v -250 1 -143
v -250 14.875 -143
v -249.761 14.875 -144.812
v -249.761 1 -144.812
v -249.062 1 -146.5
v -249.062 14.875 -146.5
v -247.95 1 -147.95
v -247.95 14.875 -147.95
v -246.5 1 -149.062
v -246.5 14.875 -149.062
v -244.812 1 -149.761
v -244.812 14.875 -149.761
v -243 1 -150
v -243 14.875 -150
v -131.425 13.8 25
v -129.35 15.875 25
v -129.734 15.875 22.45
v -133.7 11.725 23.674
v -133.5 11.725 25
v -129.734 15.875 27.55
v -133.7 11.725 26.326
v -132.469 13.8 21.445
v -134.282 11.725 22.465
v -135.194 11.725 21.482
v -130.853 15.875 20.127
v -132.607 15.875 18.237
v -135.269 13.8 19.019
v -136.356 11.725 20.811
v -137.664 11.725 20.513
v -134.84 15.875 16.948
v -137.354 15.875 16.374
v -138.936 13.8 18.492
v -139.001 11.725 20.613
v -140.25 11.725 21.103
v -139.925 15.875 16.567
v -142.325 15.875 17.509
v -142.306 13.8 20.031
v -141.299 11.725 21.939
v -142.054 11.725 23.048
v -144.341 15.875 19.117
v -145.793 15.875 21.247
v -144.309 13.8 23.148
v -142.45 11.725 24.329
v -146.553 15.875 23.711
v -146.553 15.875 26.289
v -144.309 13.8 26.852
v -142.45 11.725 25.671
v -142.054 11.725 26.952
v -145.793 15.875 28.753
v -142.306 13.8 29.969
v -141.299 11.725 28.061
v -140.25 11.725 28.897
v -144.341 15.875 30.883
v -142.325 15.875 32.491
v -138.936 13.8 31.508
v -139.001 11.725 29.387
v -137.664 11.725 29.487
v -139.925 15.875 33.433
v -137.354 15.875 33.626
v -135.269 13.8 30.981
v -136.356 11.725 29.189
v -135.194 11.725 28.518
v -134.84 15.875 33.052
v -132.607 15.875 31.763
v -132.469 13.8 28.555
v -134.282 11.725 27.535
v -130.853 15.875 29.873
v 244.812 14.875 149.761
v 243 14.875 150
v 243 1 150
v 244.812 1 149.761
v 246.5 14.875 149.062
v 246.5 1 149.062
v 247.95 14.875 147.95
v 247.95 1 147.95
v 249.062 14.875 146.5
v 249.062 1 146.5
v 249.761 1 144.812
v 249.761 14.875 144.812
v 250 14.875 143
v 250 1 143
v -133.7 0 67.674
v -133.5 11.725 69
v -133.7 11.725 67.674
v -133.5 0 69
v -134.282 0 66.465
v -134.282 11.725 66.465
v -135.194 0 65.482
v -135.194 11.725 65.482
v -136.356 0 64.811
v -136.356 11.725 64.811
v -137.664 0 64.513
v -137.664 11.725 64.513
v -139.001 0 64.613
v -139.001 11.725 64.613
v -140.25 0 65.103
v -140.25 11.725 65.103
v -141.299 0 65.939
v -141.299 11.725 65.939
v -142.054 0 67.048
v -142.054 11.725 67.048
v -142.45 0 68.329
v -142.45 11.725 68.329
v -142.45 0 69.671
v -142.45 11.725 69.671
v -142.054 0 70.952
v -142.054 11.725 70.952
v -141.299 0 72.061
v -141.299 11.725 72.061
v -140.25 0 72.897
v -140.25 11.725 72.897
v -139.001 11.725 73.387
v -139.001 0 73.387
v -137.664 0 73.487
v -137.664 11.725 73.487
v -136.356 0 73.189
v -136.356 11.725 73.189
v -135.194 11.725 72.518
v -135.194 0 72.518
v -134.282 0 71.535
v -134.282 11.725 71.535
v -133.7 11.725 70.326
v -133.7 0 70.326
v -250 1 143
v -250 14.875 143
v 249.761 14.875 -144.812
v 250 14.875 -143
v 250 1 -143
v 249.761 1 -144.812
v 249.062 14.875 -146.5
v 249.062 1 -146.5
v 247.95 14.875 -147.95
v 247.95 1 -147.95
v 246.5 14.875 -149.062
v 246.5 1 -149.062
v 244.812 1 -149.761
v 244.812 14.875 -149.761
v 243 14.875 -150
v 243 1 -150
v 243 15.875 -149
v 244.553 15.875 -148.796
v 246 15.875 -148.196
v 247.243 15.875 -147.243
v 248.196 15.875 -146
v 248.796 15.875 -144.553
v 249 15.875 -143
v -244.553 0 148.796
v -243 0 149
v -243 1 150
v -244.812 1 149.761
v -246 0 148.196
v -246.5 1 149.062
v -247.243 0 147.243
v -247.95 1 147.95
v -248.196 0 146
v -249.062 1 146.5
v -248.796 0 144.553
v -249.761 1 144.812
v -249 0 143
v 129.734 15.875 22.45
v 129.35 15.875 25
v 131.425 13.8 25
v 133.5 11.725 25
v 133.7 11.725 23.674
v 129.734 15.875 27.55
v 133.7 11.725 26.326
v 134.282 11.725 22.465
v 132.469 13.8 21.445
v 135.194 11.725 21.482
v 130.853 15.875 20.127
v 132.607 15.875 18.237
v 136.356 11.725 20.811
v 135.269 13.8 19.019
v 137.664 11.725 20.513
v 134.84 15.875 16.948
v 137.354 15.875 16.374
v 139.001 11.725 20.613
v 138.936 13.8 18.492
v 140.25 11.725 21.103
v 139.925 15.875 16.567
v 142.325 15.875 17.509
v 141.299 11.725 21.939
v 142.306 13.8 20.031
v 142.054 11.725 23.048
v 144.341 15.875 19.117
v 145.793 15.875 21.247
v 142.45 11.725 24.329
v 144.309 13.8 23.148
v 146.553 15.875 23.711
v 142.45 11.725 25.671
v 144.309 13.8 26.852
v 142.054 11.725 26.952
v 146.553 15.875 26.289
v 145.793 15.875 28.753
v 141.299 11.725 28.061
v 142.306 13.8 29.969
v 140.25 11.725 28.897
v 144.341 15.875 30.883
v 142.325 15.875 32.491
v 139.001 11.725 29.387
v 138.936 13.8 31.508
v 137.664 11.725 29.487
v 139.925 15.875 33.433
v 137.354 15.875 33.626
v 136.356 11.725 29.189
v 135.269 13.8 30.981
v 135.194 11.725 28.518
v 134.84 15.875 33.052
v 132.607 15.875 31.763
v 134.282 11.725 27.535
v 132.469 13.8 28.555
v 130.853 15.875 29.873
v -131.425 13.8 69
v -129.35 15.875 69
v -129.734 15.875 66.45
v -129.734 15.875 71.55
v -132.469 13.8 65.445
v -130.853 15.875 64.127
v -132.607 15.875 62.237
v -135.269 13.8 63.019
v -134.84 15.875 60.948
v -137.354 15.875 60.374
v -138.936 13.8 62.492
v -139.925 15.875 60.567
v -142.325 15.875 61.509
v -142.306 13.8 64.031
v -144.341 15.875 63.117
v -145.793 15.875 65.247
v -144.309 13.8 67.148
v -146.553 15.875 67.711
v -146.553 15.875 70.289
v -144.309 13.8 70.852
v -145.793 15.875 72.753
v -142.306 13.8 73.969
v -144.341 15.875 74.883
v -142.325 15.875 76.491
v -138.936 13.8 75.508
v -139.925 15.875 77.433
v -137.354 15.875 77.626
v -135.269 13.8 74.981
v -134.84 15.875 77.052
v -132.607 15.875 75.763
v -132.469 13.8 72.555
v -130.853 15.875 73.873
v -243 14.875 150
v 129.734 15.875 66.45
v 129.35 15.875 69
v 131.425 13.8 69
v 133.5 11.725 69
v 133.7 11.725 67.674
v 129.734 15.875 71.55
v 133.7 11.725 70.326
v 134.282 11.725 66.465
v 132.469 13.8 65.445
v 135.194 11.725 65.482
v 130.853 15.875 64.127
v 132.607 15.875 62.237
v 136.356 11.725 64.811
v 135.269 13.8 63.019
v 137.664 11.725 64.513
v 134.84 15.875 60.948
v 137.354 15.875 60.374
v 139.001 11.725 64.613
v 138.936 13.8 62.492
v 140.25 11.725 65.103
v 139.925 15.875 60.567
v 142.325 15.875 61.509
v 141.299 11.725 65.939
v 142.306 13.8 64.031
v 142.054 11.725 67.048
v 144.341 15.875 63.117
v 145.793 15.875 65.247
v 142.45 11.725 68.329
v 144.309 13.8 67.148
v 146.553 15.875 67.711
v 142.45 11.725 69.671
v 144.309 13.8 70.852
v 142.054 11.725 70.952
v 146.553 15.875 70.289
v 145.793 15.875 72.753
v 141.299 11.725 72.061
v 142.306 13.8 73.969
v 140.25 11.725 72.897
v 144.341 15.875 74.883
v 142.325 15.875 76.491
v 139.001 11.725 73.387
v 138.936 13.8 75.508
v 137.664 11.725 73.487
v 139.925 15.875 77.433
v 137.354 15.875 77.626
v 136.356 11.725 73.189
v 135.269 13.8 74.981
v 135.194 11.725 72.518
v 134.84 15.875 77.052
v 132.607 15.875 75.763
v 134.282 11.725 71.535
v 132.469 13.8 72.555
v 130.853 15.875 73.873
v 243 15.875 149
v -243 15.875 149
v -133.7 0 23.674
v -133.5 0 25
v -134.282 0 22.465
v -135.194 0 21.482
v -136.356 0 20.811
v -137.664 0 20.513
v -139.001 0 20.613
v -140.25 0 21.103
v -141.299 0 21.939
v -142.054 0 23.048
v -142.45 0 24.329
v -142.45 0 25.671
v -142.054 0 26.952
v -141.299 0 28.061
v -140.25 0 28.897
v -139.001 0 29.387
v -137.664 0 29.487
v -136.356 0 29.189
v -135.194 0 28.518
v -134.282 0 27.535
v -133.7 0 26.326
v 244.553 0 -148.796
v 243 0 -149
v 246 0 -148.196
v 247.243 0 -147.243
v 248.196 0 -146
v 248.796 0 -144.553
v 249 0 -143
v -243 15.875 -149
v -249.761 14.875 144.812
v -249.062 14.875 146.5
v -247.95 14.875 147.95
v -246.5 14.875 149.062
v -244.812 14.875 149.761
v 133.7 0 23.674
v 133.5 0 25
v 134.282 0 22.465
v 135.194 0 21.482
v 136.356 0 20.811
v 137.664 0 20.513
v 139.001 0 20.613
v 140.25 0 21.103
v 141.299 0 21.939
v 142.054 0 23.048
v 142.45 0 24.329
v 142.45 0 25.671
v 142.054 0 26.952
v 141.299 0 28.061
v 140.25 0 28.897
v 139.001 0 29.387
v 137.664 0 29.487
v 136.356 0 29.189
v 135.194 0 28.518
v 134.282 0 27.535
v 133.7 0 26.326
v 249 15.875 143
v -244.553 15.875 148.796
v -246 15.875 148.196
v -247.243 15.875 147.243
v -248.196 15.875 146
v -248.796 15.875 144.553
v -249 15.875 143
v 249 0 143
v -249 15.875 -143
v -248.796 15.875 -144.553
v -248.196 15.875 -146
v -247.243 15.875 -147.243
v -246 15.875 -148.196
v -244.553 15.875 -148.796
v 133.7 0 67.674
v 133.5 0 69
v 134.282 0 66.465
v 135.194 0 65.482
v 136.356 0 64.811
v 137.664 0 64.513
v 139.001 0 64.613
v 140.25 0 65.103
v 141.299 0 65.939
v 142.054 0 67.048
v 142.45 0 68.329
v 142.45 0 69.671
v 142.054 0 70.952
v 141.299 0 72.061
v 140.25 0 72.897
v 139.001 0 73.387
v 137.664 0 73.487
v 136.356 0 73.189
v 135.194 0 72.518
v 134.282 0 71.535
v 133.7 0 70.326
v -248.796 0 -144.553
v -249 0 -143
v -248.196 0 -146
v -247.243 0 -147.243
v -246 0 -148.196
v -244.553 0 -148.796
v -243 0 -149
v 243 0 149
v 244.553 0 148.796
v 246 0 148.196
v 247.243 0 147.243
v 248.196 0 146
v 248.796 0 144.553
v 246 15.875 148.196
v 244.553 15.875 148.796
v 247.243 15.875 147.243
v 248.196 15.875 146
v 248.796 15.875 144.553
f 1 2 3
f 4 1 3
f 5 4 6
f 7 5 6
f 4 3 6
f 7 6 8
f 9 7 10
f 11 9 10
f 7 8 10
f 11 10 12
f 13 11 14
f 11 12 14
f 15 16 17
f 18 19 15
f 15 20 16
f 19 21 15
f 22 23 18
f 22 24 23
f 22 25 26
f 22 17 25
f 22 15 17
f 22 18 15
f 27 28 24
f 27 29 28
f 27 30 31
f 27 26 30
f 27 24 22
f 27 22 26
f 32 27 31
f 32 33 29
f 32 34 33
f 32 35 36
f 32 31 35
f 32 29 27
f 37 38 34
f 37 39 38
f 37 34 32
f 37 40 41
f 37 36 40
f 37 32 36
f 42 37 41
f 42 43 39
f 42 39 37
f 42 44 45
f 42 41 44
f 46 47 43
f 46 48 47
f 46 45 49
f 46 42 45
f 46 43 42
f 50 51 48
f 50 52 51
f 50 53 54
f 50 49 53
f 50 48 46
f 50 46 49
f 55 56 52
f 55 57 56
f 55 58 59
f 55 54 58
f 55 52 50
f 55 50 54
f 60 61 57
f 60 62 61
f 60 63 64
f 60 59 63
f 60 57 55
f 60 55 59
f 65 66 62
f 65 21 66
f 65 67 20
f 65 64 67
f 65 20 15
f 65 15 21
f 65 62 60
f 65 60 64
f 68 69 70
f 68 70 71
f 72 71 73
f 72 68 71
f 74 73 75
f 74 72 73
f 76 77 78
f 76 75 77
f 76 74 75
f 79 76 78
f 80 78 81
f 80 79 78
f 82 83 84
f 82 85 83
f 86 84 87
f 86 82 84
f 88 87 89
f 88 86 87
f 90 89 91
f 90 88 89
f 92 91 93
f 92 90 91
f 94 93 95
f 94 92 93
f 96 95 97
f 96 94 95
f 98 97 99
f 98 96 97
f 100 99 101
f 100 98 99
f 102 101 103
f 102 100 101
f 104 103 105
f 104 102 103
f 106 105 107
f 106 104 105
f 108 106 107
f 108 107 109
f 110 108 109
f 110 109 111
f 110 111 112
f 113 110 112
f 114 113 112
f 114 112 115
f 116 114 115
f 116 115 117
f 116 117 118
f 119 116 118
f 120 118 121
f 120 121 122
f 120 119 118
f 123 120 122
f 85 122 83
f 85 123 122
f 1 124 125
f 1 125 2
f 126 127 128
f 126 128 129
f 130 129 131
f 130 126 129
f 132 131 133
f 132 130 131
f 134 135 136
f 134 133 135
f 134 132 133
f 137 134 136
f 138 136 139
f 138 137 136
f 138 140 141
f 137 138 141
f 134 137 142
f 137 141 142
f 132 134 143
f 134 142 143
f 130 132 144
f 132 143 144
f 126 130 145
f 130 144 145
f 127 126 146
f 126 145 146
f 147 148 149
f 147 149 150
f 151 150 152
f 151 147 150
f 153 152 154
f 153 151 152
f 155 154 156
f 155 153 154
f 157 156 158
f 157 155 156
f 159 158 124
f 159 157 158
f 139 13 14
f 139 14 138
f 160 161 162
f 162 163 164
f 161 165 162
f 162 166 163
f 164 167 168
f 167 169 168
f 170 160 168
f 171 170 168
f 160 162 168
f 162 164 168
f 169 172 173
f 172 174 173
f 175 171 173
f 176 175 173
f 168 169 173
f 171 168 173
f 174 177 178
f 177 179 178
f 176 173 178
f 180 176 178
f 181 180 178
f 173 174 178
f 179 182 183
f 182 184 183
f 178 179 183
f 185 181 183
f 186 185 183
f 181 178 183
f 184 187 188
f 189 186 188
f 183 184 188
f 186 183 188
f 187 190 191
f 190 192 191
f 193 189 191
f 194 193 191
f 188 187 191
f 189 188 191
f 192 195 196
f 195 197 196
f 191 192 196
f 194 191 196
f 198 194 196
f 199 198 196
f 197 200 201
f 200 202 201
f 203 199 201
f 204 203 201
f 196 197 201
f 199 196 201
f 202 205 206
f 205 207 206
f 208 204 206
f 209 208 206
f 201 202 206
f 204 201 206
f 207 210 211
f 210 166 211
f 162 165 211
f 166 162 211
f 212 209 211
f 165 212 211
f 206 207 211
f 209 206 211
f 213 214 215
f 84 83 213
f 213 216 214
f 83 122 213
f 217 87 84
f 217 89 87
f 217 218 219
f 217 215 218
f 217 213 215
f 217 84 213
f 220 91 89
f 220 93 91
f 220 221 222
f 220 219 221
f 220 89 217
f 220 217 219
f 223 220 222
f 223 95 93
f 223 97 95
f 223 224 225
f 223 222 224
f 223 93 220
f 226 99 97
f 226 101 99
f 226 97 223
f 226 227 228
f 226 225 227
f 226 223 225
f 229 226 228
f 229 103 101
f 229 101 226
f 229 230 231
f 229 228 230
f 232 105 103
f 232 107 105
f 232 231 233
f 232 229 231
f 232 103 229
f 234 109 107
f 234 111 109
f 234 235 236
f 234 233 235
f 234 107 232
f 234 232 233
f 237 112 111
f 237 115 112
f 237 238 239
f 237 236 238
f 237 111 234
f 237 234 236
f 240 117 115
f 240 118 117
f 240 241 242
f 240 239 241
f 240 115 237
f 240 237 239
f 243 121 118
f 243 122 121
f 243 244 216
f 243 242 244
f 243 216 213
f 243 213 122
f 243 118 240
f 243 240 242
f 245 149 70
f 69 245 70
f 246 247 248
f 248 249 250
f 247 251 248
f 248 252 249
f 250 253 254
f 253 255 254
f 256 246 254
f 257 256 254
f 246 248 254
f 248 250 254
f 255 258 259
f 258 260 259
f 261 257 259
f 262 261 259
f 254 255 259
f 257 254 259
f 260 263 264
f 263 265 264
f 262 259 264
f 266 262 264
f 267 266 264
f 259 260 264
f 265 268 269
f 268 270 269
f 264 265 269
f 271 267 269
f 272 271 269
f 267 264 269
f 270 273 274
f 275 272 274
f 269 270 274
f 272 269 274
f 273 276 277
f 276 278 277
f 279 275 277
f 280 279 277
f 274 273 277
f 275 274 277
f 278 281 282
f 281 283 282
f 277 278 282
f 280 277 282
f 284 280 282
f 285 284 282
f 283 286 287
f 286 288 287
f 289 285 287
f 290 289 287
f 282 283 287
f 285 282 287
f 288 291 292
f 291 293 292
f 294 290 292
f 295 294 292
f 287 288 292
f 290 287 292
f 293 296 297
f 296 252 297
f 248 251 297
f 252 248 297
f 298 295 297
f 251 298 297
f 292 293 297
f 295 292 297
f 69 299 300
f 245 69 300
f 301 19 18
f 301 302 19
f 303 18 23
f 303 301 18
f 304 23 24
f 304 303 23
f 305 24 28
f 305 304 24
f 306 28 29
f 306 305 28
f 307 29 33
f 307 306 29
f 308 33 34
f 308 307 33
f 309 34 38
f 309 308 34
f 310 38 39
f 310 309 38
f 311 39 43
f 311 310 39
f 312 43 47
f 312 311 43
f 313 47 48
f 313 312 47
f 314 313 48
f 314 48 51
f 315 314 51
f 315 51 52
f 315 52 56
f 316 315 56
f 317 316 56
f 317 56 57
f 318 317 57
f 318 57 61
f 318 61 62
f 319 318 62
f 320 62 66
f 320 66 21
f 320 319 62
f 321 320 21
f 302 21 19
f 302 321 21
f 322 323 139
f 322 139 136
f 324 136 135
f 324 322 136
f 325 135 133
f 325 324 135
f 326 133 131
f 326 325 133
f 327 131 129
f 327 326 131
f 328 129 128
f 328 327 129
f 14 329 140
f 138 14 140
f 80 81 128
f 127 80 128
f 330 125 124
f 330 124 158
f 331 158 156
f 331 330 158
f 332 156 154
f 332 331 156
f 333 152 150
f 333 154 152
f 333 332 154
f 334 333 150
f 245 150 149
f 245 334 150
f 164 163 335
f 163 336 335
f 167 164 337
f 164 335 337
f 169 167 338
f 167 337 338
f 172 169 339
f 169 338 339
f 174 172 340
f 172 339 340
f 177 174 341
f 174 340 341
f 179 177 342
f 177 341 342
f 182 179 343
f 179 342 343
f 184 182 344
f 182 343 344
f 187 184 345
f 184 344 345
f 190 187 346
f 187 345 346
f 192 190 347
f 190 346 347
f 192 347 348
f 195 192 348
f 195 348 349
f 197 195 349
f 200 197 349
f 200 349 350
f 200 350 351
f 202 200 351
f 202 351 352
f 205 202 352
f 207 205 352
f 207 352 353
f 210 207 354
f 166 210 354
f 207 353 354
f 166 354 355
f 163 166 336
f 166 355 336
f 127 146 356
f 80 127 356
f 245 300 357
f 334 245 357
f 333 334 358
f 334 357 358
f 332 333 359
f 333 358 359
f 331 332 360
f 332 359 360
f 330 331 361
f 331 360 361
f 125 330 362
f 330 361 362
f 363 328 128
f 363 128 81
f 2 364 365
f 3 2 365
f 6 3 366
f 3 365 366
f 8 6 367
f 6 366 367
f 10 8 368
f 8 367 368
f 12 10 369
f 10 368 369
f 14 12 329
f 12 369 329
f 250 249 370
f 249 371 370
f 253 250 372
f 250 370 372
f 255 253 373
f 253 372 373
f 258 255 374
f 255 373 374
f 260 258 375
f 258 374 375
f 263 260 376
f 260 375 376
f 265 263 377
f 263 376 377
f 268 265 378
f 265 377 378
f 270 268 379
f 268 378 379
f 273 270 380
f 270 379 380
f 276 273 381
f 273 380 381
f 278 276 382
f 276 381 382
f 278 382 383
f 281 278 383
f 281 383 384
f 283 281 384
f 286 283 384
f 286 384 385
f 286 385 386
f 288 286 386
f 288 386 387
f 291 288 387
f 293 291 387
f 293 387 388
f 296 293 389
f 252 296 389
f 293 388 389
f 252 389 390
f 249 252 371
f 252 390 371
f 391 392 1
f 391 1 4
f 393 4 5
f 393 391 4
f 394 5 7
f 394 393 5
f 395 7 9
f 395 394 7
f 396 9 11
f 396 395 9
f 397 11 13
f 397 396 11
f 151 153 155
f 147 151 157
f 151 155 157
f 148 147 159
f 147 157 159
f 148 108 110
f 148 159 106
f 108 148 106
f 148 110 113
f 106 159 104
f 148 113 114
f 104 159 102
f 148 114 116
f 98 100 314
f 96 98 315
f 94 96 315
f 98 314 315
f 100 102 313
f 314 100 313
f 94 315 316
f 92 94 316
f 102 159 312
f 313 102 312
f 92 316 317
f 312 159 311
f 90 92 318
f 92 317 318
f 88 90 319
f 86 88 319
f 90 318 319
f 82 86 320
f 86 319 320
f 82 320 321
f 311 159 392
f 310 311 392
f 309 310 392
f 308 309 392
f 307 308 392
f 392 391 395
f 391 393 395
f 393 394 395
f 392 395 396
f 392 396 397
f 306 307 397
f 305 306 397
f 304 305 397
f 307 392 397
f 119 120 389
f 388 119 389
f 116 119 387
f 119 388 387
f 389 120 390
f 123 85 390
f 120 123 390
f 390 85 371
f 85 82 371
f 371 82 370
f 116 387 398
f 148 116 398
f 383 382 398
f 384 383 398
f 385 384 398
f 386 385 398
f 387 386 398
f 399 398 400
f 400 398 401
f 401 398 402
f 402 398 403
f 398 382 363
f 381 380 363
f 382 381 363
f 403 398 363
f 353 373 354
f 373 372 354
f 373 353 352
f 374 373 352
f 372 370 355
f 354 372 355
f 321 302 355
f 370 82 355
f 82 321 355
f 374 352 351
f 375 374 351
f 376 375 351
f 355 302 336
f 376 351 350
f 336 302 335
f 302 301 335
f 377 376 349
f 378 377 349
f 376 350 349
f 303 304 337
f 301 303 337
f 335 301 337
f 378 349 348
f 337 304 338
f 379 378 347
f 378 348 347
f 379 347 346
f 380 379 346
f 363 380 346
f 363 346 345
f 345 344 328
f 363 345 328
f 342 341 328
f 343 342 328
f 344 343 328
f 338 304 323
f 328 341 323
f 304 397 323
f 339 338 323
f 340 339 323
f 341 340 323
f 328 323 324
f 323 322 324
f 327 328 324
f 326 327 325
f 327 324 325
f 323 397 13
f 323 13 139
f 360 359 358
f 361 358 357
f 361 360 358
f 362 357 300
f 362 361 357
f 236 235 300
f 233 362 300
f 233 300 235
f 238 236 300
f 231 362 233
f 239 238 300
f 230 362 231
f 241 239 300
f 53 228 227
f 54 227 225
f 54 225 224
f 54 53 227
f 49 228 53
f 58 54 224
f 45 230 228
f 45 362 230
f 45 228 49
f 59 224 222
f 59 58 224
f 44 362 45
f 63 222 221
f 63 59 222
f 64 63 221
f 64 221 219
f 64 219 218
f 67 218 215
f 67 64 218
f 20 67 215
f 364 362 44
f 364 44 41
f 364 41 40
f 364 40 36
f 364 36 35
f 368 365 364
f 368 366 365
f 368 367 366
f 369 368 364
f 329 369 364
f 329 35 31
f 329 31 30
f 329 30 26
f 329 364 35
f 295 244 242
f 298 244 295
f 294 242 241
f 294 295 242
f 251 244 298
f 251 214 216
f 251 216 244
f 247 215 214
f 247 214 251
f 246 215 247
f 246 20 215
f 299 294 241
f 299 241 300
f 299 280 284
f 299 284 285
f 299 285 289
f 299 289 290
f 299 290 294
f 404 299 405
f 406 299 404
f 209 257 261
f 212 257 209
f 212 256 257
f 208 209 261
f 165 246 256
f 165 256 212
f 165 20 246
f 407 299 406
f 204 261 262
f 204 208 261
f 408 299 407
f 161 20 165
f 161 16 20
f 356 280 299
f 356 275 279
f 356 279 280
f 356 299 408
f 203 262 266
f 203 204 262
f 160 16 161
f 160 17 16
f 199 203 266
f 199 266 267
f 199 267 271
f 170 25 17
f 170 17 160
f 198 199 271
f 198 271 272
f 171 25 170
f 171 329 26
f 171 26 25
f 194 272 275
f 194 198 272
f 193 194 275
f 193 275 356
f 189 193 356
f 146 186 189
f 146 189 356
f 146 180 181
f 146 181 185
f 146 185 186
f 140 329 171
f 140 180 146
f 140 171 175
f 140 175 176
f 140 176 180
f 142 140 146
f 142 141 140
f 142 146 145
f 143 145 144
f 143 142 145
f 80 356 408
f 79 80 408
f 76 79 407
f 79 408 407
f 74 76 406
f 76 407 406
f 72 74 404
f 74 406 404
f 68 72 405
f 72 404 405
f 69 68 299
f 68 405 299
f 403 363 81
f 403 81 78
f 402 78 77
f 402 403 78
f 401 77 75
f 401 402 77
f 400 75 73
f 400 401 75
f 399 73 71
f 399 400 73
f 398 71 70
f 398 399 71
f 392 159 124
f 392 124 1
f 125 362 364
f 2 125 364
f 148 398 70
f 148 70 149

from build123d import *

# Parameters (mm, degrees)
SKETCH1_W                                       = 500
SKETCH1_H                                       = 300
BOSS_EXTRUDE1_DEPTH                             = 15.875
FILLET1_R                                       = 7
CHAMFER4_SIZE                                   = 1
CSK_FOR_M8_FLAT_HEAD_MACHINE_SCREW1_D           = 9
CSK_FOR_M8_FLAT_HEAD_MACHINE_SCREW1_CSINK_D     = 17.3
CSK_FOR_M8_FLAT_HEAD_MACHINE_SCREW1_CSINK_ANGLE = 90


with BuildPart() as part:
    # Sketch1 → Boss-Extrude1 (new body)
    with BuildSketch(Plane(origin=(0, 0, 0), x_dir=(1, 0, 0), z_dir=(0, 1, 0))):
        Rectangle(SKETCH1_W, SKETCH1_H)
    extrude(amount=BOSS_EXTRUDE1_DEPTH)

    # Fillet1
    fillet1_edges = [part.edges().sort_by_distance(p)[0] for p in [
        (250, 7.9375, 150),
        (-250, 7.9375, 150),
        (-250, 7.9375, -150),
        (250, 7.9375, -150),
    ]]
    fillet(fillet1_edges, radius=FILLET1_R)

    # Chamfer4
    chamfer4_edges = [part.edges().sort_by_distance(p)[0] for p in [
        (-250, 0, 0),
        (-250, 15.875, 0),
        (250, 0, 0),
        (0, 0, 150),
        (0, 0, -150),
        (-247.949747468, 0, 147.949747468),
        (247.949747468, 0, 147.949747468),
        (247.949747468, 0, -147.949747468),
        (-247.949747468, 0, -147.949747468),
        (0, 15.875, -150),
        (250, 15.875, 0),
        (0, 15.875, 150),
        (-247.949747468, 15.875, 147.949747468),
        (247.949747468, 15.875, 147.949747468),
        (247.949747468, 15.875, -147.949747468),
        (-247.949747468, 15.875, -147.949747468),
    ]]
    chamfer(chamfer4_edges, length=CHAMFER4_SIZE)

    # CSK for M8 Flat Head Machine Screw1 (through all)
    with Locations(Plane(origin=(0, 15.875, 0), x_dir=(1, 0, 0), z_dir=(0, 1, 0))):
        with Locations((138, -25), (138, -69)):
            csk_for_m8_flat_head_machine_screw1 = CounterSinkHole(CSK_FOR_M8_FLAT_HEAD_MACHINE_SCREW1_D / 2, CSK_FOR_M8_FLAT_HEAD_MACHINE_SCREW1_CSINK_D / 2, counter_sink_angle=CSK_FOR_M8_FLAT_HEAD_MACHINE_SCREW1_CSINK_ANGLE)

    # Mirror3: CSK for M8 Flat Head Machine Screw1 across plane
    add(csk_for_m8_flat_head_machine_screw1.mirror(Plane(origin=(0, 0, 0), x_dir=(0, 0, 1), z_dir=(1, 0, 0))), mode=Mode.SUBTRACT)


solid = part.part
